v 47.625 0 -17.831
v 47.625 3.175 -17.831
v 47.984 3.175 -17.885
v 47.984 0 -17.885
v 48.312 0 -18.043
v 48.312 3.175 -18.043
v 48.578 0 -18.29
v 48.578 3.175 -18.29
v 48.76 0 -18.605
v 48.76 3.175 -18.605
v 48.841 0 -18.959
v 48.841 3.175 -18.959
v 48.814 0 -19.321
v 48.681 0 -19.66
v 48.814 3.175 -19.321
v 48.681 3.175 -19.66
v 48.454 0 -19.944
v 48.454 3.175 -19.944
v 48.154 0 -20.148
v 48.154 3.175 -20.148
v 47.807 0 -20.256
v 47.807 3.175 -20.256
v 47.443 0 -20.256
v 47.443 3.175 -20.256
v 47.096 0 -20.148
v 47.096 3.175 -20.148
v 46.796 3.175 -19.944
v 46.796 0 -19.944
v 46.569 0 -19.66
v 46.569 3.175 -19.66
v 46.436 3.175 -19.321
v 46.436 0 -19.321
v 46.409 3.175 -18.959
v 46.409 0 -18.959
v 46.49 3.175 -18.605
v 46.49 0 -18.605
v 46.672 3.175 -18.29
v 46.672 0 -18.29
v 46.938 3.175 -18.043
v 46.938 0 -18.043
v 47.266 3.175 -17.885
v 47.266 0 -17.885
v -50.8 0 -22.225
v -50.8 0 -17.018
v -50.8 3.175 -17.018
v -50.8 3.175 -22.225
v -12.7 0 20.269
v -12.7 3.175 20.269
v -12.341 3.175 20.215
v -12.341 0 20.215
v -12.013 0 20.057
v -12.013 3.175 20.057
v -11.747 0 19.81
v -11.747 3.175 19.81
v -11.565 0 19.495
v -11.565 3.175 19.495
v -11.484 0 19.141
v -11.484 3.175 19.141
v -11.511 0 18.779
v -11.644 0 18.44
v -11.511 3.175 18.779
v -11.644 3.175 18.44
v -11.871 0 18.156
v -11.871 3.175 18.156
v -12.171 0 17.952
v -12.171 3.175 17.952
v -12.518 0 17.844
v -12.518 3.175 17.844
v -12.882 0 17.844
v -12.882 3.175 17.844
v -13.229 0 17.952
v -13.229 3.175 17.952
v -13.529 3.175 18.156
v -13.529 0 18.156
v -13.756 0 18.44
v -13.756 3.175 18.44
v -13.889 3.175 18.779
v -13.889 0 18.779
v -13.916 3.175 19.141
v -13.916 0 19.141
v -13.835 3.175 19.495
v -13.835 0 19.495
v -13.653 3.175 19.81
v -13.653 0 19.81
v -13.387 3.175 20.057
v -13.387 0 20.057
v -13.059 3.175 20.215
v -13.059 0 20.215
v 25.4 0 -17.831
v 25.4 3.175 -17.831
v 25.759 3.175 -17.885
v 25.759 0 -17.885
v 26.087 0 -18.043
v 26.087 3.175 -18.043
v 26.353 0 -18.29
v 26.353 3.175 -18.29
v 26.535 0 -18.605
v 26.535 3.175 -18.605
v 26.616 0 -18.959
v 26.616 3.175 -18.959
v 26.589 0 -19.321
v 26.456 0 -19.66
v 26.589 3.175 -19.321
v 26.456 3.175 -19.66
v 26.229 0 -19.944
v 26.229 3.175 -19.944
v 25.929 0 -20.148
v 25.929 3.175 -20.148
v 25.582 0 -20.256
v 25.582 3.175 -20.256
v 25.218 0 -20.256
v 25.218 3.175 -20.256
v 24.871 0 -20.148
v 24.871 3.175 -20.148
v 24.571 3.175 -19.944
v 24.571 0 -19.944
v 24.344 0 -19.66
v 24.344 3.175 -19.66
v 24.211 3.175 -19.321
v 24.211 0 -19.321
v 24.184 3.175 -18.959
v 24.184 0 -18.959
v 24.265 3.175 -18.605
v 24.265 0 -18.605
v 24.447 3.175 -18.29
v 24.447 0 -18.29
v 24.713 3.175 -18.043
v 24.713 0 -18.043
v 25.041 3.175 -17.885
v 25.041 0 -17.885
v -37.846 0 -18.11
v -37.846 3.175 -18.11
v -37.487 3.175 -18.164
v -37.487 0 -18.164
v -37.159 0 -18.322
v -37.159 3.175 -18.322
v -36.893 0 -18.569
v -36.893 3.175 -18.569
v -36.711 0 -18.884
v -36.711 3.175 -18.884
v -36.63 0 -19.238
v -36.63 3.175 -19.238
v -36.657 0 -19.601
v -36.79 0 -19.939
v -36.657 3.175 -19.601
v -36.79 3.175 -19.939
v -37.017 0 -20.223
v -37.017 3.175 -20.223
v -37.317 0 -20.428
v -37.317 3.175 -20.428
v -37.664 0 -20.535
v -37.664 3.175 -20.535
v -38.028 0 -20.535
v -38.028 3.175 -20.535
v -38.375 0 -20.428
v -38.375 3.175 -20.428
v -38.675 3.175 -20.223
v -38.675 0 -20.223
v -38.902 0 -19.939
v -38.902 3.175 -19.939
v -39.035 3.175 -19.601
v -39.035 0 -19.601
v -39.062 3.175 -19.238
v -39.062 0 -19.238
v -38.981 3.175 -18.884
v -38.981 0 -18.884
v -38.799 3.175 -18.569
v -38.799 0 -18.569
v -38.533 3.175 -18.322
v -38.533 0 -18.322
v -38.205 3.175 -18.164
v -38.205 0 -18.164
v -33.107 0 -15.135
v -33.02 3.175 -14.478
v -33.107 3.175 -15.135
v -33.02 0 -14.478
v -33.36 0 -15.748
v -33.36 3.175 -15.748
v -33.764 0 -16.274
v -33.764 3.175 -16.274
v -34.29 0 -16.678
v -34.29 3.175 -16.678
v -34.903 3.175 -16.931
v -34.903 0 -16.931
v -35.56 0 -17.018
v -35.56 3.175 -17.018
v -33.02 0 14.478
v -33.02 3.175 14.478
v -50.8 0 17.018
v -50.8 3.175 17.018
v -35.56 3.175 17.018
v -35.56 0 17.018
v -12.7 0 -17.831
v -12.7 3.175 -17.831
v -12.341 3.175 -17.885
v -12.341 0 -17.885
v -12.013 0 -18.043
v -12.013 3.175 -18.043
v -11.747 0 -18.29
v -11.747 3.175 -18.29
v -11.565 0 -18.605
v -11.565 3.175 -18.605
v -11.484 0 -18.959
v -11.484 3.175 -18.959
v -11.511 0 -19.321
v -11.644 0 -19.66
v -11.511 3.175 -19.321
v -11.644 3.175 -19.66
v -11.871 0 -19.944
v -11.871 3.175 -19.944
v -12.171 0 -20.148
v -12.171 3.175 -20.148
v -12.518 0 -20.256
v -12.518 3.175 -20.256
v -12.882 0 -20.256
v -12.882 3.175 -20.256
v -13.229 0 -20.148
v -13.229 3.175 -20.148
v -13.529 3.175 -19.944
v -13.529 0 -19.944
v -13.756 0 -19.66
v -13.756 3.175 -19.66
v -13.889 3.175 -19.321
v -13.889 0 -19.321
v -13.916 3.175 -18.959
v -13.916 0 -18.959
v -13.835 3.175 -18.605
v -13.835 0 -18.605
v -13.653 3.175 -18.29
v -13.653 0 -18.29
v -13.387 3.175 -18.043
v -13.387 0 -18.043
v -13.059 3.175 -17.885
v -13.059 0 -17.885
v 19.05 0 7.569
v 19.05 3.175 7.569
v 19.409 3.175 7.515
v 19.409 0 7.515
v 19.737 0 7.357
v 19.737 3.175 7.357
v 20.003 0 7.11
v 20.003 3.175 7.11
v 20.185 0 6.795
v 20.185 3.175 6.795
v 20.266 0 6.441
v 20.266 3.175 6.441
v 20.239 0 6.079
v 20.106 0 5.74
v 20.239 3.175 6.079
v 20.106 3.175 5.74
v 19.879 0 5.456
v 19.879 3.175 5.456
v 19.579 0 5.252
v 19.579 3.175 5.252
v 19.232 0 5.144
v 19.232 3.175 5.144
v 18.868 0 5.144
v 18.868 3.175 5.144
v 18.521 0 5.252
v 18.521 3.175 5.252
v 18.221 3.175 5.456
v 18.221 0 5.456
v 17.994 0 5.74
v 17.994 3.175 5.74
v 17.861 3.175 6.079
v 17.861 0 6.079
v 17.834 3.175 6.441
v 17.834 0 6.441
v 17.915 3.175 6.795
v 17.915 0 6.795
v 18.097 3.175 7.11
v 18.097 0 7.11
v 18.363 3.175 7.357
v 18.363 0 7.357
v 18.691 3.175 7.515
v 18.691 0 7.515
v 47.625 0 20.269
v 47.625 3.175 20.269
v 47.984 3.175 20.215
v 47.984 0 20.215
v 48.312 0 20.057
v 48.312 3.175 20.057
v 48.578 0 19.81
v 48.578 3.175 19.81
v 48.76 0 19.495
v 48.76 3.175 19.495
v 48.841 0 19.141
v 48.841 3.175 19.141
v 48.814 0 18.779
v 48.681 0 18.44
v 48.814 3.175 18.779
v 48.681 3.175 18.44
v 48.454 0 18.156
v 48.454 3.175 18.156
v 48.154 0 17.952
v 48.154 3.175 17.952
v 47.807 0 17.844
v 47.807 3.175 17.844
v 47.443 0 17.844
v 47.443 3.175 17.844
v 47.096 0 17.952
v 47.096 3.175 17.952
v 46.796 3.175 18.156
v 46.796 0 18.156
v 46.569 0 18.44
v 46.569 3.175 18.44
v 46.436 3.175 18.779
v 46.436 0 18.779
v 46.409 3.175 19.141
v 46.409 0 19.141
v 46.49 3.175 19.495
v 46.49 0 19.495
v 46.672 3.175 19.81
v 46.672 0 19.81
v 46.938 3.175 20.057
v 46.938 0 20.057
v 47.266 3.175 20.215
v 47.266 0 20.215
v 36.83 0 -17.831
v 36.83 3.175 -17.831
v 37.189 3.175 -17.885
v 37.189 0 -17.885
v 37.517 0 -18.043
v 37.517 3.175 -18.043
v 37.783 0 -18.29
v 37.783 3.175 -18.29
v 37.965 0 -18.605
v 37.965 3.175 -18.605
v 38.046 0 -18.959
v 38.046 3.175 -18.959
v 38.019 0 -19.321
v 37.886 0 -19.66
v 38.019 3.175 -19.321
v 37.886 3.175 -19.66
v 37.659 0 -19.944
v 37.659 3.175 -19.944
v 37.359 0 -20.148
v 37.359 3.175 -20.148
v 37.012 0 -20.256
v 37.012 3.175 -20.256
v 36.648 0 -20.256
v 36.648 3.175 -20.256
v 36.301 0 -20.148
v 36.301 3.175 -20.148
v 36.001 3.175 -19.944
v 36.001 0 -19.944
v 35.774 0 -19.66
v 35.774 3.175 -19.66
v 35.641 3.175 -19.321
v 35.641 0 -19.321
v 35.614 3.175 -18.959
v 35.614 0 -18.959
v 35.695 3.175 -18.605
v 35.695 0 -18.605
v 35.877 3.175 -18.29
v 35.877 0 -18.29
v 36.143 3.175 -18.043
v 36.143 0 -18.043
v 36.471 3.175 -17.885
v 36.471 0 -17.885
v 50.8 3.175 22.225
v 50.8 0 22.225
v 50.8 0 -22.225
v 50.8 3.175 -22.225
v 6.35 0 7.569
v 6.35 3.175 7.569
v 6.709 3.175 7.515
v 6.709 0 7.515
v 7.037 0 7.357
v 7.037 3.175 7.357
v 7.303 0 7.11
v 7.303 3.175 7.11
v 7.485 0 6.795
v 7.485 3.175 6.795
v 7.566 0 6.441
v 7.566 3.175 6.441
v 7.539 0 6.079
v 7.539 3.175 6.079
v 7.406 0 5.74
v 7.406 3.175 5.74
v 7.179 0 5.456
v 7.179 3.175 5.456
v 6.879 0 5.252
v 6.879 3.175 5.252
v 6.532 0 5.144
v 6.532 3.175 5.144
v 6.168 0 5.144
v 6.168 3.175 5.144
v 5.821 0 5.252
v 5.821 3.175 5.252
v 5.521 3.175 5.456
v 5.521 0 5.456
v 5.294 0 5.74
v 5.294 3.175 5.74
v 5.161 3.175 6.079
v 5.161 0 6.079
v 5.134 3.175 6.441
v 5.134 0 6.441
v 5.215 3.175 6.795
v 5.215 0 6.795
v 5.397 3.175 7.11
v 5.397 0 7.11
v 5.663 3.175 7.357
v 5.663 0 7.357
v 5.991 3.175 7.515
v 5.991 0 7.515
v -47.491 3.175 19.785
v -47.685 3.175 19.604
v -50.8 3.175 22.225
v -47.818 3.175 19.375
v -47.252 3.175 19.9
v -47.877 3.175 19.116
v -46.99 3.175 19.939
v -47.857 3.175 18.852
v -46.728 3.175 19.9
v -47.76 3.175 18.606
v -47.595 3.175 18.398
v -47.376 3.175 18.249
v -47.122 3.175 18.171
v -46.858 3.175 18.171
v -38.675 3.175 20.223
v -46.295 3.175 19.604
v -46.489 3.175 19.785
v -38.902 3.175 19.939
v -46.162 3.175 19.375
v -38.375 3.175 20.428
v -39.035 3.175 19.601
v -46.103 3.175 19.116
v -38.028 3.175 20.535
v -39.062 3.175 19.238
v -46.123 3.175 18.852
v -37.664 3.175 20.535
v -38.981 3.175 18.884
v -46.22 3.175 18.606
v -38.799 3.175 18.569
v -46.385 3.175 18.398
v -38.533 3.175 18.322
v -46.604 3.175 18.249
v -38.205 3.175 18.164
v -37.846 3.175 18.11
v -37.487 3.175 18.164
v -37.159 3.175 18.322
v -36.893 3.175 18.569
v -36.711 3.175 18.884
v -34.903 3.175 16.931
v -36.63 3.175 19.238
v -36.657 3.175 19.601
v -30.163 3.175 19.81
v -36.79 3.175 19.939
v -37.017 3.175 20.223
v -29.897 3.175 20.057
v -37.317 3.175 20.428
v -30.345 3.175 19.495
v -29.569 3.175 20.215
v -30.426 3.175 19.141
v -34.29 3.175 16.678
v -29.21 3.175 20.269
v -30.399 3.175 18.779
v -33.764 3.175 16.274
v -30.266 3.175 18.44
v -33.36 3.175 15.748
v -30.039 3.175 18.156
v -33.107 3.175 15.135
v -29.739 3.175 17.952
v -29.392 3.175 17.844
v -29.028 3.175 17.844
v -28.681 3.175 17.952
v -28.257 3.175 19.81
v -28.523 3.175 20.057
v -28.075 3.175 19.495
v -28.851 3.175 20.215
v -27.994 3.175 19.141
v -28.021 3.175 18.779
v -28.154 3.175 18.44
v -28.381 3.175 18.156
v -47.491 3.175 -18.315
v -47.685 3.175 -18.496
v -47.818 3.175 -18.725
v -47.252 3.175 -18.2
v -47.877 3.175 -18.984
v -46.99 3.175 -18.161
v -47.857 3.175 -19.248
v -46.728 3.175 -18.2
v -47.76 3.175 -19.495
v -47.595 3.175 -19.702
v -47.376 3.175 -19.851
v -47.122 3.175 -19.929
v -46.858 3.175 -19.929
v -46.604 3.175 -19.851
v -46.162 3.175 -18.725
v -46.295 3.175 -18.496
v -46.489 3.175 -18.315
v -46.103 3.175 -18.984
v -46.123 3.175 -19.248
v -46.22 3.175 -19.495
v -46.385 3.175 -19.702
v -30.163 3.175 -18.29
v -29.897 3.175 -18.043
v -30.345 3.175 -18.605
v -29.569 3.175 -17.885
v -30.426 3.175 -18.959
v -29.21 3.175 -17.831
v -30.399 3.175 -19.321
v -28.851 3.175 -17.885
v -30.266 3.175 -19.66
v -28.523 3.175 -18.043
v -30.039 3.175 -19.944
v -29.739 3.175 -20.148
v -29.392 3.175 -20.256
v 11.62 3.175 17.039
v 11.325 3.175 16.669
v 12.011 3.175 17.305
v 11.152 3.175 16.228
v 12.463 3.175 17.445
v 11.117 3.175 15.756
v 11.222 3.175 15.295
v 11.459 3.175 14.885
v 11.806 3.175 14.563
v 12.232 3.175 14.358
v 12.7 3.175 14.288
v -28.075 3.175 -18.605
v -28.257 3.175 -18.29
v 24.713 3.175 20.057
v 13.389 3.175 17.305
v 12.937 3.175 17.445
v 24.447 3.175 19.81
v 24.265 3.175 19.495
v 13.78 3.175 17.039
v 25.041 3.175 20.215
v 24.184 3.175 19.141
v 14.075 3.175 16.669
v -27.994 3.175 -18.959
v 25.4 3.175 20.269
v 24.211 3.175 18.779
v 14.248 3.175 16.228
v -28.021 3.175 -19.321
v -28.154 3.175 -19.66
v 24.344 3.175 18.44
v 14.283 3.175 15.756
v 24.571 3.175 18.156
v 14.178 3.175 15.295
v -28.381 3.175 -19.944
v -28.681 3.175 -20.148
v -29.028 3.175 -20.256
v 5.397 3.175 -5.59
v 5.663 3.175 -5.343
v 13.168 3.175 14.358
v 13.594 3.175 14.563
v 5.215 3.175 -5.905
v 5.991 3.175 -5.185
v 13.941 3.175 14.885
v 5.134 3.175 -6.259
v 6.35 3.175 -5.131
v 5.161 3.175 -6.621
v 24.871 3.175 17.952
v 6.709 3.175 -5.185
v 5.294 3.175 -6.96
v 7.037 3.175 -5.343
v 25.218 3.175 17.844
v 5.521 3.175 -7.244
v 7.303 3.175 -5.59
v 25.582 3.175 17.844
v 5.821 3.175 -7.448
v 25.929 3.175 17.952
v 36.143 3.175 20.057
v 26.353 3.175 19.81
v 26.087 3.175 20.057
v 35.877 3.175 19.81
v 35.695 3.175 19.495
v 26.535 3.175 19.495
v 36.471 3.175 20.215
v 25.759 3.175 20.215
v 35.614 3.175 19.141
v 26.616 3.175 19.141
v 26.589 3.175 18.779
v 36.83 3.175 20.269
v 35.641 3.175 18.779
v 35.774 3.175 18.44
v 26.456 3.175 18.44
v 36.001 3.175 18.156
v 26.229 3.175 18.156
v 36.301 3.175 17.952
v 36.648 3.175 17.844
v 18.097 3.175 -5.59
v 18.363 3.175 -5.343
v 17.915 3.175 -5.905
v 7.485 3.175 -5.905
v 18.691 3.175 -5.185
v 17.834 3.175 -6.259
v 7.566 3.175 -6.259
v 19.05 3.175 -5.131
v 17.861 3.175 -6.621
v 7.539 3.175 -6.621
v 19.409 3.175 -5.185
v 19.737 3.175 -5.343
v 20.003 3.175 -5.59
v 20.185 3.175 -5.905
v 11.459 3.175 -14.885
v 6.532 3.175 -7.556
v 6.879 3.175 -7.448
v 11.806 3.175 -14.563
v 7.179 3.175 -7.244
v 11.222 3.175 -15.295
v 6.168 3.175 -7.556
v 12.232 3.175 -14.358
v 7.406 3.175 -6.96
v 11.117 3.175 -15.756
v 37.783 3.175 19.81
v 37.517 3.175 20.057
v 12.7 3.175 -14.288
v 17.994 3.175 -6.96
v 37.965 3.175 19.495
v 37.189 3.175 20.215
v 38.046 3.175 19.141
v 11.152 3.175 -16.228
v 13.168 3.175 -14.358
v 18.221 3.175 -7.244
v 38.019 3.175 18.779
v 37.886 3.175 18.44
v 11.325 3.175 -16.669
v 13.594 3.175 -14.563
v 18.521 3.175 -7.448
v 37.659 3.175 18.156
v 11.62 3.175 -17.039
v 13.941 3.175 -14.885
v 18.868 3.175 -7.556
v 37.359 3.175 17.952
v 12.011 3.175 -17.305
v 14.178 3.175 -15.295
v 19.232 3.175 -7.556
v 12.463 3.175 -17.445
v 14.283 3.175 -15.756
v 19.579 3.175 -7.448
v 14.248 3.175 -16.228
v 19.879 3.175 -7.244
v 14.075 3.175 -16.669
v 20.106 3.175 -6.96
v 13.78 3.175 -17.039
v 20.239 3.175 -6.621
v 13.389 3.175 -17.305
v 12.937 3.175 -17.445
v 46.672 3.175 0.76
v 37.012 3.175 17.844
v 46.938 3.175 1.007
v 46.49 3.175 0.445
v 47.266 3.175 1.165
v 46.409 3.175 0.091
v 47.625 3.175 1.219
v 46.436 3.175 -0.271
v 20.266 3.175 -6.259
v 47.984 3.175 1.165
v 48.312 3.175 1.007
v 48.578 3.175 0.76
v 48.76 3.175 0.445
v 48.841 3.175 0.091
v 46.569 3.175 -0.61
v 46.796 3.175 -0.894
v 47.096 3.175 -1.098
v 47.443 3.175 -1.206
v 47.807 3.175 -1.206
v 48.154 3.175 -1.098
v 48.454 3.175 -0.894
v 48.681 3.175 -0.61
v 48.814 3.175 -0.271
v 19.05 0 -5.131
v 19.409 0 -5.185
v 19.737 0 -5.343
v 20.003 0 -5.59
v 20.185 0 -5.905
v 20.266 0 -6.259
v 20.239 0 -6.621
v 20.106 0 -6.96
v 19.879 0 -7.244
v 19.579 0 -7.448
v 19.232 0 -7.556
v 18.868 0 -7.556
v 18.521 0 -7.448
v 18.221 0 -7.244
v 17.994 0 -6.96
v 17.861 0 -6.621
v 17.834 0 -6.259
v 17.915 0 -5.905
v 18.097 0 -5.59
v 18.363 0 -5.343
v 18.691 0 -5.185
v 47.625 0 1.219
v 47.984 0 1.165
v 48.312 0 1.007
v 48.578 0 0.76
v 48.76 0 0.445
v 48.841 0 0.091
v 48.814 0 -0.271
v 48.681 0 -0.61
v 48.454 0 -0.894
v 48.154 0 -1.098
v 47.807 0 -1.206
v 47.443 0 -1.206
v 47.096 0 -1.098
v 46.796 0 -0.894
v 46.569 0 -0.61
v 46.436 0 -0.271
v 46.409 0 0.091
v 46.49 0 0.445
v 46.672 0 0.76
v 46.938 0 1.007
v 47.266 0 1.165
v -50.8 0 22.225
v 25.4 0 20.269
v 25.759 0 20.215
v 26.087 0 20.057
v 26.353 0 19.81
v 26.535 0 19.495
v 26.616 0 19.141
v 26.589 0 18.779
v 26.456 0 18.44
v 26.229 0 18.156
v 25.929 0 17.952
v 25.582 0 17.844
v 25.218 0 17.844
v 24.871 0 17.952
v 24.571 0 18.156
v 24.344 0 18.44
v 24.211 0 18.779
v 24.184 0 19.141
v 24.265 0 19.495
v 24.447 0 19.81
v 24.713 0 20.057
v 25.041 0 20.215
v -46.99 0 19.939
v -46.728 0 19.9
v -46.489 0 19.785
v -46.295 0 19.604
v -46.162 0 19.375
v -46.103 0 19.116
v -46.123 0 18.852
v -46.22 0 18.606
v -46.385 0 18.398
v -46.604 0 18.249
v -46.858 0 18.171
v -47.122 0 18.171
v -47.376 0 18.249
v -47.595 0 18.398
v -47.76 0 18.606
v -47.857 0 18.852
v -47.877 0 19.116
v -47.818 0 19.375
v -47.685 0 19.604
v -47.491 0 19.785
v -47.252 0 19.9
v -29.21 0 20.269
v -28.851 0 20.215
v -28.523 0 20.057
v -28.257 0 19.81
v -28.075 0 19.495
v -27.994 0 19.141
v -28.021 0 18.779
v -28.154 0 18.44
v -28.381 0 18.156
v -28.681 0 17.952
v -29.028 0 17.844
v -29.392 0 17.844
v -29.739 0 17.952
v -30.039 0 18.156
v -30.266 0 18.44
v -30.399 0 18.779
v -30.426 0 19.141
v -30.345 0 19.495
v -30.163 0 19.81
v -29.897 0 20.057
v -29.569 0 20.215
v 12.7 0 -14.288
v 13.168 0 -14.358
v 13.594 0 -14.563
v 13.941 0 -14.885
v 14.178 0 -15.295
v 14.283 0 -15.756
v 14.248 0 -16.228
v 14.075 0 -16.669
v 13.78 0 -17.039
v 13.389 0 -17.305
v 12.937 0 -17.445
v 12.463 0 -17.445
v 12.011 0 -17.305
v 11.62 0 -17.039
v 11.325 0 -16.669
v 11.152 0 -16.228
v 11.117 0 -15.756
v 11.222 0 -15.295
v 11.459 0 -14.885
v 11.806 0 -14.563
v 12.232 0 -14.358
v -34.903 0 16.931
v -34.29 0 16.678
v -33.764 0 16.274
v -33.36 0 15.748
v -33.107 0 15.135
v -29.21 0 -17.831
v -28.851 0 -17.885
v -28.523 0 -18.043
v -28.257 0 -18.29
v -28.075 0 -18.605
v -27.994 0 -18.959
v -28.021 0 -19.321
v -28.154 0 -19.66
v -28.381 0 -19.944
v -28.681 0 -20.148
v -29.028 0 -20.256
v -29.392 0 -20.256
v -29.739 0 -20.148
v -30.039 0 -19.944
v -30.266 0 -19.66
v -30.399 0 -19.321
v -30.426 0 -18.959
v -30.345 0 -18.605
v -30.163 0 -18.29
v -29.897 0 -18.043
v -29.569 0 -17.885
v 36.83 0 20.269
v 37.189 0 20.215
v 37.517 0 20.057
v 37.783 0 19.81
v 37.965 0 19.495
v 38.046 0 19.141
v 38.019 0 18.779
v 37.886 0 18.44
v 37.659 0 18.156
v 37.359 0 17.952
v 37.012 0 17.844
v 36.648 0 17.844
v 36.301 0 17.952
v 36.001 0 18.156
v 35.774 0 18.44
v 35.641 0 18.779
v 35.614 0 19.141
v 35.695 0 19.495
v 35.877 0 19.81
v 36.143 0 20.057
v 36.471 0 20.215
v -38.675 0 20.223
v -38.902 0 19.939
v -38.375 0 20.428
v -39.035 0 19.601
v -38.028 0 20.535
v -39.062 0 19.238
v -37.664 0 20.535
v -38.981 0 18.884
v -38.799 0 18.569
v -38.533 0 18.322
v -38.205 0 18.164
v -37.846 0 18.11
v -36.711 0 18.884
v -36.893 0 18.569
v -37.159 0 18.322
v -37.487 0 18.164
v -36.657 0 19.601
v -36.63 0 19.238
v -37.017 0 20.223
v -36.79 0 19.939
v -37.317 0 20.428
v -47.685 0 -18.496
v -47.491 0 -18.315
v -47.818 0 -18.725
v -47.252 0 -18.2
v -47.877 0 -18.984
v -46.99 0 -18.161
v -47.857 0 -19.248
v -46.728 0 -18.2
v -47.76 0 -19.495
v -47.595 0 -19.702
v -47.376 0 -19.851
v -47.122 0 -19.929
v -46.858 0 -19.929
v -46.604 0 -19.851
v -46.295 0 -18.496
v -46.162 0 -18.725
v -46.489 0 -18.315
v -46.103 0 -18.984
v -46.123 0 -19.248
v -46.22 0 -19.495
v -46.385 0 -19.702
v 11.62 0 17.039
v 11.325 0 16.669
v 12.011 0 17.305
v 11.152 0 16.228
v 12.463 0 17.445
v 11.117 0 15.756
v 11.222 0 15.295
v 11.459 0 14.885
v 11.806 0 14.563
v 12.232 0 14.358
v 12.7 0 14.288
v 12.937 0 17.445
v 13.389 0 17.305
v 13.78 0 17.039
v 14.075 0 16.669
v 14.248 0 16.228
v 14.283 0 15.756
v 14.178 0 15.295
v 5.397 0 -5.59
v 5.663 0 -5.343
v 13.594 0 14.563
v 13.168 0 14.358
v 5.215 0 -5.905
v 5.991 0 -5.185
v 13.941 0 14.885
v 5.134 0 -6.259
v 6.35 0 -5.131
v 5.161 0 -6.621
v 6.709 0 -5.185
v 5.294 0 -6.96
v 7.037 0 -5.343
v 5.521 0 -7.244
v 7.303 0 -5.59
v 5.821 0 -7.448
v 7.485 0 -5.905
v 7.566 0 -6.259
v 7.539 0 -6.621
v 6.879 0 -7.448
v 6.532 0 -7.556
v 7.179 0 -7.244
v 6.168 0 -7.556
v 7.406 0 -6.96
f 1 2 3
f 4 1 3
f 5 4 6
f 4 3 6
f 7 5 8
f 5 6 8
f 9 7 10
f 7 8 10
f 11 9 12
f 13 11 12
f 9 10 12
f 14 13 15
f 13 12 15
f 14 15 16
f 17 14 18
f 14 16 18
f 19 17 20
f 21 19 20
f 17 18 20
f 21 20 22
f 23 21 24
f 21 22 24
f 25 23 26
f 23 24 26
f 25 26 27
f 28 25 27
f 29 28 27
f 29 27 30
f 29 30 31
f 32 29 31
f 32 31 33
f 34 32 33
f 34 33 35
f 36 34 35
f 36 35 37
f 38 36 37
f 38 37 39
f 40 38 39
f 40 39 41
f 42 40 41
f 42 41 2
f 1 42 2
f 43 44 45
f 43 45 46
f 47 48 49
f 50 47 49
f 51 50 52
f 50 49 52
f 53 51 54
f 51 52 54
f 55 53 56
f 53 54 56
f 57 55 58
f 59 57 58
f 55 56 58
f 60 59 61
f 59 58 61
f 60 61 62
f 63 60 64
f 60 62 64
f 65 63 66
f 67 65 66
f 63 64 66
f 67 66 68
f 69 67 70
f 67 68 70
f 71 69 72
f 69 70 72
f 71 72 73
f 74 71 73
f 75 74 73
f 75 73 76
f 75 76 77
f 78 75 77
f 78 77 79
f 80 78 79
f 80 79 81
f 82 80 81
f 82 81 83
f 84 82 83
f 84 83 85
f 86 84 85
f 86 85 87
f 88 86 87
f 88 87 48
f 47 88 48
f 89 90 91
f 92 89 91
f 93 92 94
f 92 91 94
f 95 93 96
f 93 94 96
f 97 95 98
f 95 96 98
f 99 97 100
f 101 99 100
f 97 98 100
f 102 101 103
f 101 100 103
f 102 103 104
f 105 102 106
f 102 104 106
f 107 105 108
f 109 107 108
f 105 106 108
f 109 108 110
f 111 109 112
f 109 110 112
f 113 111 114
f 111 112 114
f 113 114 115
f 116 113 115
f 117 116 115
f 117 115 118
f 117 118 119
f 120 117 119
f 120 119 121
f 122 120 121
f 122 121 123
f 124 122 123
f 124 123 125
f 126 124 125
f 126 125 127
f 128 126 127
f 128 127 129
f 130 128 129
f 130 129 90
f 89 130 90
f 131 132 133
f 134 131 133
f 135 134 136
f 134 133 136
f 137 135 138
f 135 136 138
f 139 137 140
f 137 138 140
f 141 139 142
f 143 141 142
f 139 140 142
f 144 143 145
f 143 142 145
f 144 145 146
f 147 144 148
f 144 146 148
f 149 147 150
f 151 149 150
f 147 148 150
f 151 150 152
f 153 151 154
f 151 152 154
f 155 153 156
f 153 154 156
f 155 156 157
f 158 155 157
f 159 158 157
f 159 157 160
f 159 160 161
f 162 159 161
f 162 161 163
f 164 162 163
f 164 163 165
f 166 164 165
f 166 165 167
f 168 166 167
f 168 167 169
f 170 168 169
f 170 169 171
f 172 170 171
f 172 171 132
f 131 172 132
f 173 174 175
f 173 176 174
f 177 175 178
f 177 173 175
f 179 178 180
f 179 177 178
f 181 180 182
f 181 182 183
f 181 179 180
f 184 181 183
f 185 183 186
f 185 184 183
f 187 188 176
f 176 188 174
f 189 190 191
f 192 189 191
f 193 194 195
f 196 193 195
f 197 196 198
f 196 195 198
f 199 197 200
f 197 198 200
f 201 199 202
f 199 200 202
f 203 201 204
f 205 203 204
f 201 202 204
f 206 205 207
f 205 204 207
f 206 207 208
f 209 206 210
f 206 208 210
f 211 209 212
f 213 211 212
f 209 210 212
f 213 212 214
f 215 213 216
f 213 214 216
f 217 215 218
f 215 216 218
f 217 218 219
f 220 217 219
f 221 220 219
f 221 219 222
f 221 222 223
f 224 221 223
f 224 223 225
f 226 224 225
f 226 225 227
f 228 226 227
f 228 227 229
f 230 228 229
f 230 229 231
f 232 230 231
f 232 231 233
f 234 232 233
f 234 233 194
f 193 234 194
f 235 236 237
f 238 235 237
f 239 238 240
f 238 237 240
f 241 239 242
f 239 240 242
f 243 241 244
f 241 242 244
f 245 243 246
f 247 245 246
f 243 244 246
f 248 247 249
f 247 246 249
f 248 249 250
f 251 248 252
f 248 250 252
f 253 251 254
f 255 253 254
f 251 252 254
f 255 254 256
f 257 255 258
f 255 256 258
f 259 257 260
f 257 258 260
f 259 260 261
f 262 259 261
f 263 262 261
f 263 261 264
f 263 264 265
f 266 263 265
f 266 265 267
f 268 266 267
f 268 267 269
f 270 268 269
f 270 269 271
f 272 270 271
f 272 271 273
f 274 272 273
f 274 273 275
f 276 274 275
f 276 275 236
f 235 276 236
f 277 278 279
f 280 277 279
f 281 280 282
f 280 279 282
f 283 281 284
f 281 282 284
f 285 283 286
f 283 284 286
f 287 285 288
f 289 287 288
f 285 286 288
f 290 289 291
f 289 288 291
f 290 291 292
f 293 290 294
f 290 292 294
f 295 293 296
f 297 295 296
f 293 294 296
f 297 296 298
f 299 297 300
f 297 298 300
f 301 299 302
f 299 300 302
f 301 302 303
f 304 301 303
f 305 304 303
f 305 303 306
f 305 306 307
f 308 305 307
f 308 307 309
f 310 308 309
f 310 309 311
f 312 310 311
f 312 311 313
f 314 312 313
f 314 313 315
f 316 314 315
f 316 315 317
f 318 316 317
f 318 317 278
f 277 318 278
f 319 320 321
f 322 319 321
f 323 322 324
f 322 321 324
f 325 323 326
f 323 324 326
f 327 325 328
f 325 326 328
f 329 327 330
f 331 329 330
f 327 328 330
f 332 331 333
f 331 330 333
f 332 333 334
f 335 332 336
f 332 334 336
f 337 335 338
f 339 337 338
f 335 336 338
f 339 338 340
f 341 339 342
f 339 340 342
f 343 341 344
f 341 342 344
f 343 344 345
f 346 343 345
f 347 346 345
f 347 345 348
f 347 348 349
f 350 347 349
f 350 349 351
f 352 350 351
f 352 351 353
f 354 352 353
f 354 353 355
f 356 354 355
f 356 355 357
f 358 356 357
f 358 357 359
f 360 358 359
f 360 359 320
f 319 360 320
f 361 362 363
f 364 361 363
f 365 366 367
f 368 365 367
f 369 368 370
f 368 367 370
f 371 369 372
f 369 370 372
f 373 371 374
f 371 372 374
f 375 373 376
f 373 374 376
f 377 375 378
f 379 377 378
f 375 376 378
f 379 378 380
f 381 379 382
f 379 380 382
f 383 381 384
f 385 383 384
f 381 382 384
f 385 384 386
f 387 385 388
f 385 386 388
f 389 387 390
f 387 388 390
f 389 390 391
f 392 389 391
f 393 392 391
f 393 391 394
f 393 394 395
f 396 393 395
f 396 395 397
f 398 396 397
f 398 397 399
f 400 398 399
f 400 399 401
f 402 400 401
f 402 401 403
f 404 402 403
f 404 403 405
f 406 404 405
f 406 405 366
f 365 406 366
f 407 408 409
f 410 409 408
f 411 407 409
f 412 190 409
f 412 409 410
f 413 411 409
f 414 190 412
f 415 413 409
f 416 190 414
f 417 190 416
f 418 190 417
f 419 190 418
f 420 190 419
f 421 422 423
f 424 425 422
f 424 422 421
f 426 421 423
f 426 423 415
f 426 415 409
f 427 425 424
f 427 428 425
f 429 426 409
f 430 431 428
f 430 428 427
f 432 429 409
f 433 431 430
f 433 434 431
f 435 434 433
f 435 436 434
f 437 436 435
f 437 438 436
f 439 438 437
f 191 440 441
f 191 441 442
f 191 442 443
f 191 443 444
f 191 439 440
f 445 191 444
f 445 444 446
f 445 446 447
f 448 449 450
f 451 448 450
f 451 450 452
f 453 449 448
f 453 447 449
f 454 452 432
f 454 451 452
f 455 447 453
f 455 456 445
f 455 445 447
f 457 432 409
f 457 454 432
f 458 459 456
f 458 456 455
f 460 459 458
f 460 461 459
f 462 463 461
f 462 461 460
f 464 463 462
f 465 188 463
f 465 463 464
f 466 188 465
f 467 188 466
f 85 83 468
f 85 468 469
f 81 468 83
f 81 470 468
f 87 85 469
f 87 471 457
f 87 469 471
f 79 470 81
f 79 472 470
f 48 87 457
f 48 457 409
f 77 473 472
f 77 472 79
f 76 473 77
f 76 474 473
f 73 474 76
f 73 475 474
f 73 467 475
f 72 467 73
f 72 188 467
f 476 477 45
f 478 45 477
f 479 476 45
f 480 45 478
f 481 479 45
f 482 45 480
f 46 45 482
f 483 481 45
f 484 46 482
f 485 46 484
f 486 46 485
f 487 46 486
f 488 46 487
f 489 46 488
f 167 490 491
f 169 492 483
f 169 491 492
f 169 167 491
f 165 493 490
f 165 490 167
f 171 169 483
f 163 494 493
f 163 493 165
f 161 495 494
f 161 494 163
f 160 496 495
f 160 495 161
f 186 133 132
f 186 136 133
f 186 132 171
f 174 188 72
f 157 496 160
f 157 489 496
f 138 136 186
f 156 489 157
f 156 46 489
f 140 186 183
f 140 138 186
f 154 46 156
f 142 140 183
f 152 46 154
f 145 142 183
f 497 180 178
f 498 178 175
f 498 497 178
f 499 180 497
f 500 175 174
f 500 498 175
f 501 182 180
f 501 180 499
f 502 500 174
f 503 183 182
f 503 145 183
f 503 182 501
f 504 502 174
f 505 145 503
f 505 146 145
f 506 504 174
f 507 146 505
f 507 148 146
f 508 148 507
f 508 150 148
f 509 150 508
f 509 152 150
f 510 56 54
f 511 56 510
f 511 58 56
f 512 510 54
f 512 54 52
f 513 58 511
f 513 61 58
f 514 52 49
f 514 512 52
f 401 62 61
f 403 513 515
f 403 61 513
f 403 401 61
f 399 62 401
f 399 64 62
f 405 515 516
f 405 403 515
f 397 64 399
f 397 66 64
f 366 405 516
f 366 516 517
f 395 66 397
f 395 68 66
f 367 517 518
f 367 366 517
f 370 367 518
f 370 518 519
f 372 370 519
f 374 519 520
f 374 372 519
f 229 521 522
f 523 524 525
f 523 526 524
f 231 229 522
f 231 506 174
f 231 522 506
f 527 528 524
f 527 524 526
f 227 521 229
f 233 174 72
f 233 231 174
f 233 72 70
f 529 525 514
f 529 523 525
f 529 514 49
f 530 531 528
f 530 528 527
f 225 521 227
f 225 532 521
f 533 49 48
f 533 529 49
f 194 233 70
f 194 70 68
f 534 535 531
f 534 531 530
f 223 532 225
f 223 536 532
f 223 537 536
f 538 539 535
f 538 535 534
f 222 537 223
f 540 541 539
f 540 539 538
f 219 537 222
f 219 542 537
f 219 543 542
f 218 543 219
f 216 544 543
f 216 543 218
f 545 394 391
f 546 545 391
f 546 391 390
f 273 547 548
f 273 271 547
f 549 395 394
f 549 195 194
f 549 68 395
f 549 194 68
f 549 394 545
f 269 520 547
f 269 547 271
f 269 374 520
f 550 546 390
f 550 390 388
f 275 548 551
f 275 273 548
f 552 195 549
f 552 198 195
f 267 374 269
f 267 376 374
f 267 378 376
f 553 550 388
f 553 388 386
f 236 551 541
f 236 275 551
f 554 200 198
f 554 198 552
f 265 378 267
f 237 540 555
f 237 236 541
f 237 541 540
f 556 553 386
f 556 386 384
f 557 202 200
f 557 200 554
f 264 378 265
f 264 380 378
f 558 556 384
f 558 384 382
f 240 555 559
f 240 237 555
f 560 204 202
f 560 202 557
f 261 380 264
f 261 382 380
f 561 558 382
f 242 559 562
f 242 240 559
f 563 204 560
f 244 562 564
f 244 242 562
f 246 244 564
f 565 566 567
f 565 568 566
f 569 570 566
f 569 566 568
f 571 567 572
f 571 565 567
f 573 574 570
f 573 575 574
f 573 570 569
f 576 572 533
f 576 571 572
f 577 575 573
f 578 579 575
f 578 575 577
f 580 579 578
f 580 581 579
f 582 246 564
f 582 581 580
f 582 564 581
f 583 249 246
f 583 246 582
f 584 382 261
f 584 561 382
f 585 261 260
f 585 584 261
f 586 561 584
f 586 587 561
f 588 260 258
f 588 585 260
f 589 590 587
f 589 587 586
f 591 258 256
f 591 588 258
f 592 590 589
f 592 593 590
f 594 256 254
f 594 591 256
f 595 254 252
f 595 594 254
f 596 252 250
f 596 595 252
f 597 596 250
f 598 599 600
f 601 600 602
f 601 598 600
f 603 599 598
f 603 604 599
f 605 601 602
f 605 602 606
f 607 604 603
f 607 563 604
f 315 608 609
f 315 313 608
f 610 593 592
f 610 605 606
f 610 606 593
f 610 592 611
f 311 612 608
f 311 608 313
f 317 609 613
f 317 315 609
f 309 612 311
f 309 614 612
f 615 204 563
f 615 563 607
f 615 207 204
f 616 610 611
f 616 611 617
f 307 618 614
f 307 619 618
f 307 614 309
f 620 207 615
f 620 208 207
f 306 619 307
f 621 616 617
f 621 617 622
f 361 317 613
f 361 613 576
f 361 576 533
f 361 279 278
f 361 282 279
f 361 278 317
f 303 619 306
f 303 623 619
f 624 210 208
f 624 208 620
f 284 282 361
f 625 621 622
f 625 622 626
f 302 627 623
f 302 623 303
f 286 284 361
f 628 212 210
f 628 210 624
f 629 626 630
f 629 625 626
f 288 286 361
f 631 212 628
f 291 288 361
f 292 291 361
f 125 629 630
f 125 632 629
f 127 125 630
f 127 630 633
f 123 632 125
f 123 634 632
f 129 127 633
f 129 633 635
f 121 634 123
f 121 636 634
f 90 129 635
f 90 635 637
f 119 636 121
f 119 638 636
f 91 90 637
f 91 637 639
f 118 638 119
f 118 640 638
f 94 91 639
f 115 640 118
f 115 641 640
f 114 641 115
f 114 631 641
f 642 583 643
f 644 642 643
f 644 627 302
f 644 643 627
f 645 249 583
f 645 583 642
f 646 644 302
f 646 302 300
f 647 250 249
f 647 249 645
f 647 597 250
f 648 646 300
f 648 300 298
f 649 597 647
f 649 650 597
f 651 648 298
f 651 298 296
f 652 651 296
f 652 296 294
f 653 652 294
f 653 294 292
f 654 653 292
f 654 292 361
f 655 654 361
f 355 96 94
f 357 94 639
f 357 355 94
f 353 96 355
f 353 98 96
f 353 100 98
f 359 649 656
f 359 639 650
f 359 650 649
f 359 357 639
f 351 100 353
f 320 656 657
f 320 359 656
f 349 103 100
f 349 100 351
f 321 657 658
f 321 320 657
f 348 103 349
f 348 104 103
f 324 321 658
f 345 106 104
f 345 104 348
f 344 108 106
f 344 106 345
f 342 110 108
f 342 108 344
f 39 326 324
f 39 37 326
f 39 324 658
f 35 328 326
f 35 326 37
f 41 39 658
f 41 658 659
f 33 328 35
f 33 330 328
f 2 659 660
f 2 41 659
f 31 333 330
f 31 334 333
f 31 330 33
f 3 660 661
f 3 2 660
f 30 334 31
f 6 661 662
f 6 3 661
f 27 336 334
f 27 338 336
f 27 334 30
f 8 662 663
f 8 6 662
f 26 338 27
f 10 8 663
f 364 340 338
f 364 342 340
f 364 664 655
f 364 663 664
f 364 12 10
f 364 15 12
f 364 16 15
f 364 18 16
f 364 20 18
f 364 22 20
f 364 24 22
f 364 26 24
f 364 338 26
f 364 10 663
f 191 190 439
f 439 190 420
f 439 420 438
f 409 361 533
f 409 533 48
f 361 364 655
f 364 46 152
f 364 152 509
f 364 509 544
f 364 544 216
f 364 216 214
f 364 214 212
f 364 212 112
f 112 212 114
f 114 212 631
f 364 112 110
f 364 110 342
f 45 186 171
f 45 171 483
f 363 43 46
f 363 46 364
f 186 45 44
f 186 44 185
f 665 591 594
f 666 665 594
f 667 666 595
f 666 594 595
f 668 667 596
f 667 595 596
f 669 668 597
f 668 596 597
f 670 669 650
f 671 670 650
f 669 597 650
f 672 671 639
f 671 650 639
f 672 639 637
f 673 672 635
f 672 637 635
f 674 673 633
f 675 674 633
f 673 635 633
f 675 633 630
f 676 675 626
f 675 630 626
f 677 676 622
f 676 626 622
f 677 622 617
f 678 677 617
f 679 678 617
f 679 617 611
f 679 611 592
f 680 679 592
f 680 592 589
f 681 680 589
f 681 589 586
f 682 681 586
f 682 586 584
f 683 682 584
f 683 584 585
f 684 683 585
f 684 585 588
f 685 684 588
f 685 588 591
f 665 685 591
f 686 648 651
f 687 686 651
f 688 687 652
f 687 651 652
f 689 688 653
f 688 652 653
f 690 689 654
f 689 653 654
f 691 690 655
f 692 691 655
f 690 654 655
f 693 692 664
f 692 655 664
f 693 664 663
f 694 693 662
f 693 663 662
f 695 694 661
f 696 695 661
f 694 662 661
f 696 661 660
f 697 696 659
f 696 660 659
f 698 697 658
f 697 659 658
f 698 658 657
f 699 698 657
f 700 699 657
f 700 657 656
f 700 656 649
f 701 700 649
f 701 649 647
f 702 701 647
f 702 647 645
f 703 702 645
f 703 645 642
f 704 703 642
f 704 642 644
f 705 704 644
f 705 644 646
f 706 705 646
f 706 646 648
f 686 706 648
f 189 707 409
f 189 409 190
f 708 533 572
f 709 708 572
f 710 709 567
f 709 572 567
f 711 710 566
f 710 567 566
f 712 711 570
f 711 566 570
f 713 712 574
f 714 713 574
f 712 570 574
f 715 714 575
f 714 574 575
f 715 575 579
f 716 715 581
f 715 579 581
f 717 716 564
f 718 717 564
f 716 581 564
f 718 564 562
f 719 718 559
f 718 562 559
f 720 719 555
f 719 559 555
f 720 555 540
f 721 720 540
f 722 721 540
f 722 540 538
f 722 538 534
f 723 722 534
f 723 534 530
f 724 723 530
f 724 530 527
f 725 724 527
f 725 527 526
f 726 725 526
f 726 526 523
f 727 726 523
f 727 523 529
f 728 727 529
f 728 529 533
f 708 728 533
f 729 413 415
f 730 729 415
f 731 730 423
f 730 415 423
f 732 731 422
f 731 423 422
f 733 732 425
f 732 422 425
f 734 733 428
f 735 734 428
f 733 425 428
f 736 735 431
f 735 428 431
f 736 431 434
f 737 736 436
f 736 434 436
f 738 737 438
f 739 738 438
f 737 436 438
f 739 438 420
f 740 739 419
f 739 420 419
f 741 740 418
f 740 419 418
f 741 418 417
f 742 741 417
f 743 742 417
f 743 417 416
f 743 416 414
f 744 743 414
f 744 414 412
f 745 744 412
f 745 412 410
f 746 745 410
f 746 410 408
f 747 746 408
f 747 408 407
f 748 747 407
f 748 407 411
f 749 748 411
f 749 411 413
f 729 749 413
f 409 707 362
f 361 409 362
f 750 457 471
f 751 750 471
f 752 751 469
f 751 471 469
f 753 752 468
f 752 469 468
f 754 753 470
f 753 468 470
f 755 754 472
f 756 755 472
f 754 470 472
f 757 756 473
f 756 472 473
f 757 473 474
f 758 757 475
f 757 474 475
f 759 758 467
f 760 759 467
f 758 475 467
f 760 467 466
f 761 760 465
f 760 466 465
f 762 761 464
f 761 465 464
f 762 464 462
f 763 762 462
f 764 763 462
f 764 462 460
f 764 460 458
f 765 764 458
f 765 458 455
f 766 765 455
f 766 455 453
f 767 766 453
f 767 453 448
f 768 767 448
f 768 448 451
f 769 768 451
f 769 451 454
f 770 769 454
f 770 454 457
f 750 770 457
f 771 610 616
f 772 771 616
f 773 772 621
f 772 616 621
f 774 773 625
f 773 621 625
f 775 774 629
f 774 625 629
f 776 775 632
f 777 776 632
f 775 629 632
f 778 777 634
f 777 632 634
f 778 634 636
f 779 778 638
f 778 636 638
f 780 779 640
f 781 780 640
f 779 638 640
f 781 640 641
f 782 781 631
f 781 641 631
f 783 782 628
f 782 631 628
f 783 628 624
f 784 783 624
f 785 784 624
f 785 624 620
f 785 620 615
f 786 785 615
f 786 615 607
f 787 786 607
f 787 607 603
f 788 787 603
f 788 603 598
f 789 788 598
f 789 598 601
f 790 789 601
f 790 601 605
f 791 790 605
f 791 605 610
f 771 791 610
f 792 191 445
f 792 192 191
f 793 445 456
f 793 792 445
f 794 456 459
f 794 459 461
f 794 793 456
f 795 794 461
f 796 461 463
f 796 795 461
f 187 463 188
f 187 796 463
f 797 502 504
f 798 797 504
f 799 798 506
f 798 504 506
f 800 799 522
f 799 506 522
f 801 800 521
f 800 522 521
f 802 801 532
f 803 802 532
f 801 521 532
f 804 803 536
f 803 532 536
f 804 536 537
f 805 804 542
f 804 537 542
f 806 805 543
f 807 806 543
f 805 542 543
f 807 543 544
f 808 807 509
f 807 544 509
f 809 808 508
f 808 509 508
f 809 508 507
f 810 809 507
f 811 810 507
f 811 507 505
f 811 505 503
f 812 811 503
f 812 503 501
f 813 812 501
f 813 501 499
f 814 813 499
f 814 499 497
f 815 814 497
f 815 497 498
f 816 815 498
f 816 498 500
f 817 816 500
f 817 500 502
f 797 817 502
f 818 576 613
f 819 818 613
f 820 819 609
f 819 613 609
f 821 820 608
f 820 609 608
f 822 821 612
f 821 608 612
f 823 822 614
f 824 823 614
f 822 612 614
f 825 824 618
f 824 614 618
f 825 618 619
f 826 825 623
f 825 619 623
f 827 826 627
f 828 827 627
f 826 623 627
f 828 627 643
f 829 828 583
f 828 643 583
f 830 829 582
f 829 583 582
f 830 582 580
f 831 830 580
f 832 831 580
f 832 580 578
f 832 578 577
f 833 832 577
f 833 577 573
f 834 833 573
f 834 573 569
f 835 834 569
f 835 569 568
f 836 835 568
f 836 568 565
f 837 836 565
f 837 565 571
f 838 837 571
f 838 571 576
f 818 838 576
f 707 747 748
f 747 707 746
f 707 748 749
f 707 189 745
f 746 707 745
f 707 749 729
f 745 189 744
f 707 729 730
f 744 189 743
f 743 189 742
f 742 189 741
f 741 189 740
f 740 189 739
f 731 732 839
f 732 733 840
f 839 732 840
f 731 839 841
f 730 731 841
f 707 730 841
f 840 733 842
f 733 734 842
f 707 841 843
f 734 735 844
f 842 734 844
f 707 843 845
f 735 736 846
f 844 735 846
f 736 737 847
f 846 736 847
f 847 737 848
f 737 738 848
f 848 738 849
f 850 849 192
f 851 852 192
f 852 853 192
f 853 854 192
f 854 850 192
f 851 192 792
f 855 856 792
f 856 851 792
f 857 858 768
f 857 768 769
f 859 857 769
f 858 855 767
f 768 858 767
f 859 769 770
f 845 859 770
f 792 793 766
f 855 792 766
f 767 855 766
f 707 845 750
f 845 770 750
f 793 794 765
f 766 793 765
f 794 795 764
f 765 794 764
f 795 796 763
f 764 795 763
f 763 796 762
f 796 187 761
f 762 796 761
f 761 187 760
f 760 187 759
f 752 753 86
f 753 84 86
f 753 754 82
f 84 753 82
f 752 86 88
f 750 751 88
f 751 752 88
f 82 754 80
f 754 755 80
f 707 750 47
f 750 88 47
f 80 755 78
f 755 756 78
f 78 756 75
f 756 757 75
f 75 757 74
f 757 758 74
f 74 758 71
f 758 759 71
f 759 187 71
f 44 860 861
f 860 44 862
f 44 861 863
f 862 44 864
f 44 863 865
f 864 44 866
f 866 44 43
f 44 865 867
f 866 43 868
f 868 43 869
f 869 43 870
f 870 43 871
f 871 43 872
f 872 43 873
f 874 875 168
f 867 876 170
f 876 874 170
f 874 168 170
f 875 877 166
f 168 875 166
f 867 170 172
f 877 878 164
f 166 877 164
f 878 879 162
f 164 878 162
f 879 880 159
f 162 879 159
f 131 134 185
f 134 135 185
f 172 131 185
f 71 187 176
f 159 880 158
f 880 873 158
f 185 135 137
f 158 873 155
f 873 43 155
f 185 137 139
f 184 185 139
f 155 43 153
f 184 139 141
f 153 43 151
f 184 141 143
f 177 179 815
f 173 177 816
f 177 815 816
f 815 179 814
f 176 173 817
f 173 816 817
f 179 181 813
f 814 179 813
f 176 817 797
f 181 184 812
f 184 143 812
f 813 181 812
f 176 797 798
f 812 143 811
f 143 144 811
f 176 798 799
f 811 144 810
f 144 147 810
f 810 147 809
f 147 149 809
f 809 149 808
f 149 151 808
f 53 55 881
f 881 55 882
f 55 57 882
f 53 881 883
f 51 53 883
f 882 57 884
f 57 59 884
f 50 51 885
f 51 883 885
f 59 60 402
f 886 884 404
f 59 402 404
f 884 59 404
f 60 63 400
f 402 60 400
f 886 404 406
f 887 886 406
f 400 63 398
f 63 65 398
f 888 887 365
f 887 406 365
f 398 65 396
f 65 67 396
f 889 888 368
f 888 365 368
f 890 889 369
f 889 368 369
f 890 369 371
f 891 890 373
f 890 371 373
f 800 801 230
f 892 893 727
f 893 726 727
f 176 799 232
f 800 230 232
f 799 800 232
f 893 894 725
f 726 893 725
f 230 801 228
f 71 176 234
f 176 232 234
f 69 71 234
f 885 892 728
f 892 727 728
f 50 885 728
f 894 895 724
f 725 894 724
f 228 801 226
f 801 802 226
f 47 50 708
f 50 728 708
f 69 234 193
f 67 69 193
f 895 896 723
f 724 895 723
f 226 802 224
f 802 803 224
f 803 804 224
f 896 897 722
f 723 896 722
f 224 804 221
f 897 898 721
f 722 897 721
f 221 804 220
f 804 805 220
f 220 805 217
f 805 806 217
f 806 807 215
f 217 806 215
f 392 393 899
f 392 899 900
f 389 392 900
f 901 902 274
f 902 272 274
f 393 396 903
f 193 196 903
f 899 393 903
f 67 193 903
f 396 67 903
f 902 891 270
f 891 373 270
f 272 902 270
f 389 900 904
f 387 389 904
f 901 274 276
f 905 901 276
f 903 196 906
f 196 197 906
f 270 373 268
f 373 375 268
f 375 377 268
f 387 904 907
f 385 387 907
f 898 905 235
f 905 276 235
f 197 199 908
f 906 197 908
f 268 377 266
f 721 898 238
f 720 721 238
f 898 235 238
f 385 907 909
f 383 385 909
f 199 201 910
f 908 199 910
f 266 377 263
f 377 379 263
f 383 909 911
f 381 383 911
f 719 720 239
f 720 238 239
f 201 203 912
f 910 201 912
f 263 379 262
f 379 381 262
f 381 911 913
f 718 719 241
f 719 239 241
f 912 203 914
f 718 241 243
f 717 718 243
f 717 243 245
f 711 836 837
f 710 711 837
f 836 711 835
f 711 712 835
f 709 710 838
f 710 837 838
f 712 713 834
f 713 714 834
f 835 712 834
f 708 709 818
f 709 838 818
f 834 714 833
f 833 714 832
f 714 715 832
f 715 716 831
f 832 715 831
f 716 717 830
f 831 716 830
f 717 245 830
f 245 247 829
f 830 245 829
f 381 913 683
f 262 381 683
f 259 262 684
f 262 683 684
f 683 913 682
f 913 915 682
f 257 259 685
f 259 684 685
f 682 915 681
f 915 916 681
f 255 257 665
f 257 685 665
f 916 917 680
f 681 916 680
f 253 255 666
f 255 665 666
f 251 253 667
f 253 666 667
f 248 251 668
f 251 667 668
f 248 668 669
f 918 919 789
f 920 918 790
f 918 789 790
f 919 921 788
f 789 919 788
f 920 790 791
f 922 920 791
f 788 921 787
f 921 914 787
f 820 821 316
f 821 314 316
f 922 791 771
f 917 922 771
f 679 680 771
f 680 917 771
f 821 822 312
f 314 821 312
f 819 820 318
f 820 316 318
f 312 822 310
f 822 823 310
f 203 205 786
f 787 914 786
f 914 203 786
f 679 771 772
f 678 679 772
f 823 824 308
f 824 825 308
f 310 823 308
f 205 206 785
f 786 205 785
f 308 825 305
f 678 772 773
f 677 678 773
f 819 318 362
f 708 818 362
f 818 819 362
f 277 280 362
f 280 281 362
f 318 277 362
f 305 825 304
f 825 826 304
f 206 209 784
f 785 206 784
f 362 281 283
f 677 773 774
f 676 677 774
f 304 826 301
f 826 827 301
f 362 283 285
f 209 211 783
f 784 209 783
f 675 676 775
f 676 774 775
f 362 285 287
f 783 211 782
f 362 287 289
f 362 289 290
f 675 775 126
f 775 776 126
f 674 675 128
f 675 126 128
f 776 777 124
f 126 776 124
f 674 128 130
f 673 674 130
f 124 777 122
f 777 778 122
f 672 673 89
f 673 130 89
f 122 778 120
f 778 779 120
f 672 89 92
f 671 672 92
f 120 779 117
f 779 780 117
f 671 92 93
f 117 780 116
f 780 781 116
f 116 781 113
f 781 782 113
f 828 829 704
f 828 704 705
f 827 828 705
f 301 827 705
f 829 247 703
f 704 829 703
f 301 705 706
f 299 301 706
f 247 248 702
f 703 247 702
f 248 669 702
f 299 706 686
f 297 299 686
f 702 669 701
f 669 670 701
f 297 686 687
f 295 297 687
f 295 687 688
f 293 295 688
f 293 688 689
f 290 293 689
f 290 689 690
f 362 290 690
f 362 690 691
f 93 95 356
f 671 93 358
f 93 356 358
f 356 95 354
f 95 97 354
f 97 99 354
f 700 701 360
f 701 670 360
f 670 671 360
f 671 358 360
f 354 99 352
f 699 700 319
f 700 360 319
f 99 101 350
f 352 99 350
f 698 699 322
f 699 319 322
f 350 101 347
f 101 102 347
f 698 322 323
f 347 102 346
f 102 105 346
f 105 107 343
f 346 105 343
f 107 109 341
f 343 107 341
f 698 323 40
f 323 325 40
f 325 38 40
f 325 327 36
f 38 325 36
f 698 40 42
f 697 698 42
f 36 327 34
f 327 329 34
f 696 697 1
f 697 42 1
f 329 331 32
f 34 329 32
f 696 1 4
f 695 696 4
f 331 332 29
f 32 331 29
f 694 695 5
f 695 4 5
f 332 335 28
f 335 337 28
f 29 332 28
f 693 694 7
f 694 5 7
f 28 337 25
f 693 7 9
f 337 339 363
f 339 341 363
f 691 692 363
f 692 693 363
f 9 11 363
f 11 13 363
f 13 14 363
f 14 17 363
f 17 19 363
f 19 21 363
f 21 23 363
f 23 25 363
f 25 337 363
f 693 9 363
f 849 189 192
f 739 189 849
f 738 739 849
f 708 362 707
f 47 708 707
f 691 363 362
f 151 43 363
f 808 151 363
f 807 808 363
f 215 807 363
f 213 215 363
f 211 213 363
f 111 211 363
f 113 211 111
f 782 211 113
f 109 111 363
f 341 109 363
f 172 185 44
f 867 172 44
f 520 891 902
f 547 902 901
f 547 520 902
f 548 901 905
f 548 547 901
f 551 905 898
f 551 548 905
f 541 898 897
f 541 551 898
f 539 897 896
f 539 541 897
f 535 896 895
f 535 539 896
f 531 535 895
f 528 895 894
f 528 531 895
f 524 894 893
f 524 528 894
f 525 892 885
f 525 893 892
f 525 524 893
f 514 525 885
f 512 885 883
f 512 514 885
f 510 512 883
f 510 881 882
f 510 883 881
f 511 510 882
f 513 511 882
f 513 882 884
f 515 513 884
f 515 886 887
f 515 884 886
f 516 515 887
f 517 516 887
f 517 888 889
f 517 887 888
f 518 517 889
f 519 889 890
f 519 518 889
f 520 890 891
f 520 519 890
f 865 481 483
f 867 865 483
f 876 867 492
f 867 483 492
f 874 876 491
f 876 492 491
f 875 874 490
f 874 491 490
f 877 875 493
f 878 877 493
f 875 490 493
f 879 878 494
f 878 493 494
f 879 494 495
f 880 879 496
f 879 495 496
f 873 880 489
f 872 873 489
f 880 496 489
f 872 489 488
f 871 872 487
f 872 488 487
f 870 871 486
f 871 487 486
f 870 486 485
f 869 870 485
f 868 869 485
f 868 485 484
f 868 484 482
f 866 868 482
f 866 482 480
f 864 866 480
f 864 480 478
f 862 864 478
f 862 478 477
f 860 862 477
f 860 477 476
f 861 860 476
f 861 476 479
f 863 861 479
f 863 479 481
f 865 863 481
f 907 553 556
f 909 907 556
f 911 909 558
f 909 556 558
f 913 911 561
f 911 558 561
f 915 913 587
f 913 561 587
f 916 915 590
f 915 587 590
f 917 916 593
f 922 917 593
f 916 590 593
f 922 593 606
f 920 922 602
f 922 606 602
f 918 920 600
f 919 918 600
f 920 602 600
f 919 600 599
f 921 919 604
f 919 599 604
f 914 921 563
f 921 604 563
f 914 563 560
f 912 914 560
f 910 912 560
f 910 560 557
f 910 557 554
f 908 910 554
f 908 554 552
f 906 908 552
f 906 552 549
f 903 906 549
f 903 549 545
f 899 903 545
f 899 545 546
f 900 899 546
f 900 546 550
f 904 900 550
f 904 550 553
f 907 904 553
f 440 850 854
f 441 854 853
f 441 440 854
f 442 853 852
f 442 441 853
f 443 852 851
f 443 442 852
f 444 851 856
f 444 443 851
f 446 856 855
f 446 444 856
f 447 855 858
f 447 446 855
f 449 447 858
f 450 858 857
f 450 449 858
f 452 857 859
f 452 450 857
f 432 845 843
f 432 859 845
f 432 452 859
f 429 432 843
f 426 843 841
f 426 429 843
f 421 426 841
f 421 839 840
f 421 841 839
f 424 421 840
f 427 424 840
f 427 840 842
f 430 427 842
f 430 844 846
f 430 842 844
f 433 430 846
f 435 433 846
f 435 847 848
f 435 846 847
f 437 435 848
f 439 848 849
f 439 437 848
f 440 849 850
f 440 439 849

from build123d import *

# Parameters (mm, degrees)
SKETCH1_W           = 101.6
SKETCH1_H           = 44.45
BOSS_EXTRUDE1_DEPTH = 3.175
SKETCH2_R           = 0.889
SKETCH2_R_2         = 1.2192
CUT_EXTRUDE1_DEPTH  = 56.539816798
SKETCH3_R           = 1.2192
SKETCH3_R_2         = 1.5875
CUT_EXTRUDE2_DEPTH  = 56.539816798
SKETCH4_W           = 17.78
SKETCH4_H           = 34.036
CUT_EXTRUDE3_DEPTH  = 56.539816798
FILLET2_R           = 2.54


with BuildPart() as part:
    # Sketch1 → Boss-Extrude1 (new body)
    with BuildSketch(Plane(origin=(0, 0, 0), x_dir=(1, 0, 0), z_dir=(0, 1, 0))):
        Rectangle(SKETCH1_W, SKETCH1_H)
    extrude(amount=BOSS_EXTRUDE1_DEPTH)

    # Sketch2 → Cut-Extrude1 (cut, through all)
    with BuildSketch(Plane(origin=(0, 3.175, 0), x_dir=(1, 0, 0), z_dir=(0, 1, 0))):
        with Locations(Location((-46.99, 19.05, 0), (0, 0, 270))):
            Circle(SKETCH2_R)
        with Locations(Location((-29.21, 19.05, 0), (0, 0, 270))):
            Circle(SKETCH2_R_2)
        with Locations(Location((-12.7, 19.05, 0), (0, 0, 270))):
            Circle(SKETCH2_R_2)
        with Locations(Location((25.4, 19.05, 0), (0, 0, 270))):
            Circle(SKETCH2_R_2)
        with Locations(Location((36.83, 19.05, 0), (0, 0, 270))):
            Circle(SKETCH2_R_2)
        with Locations(Location((47.625, 19.05, 0), (0, 0, 270))):
            Circle(SKETCH2_R_2)
        with Locations(Location((47.625, 0, 0), (0, 0, 270))):
            Circle(SKETCH2_R_2)
        with Locations(Location((47.625, -19.05, 0), (0, 0, 270))):
            Circle(SKETCH2_R_2)
        with Locations(Location((36.83, -19.05, 0), (0, 0, 270))):
            Circle(SKETCH2_R_2)
        with Locations(Location((25.4, -19.05, 0), (0, 0, 270))):
            Circle(SKETCH2_R_2)
        with Locations(Location((-12.7, -19.05, 0), (0, 0, 270))):
            Circle(SKETCH2_R_2)
        with Locations(Location((-29.21, -19.05, 0), (0, 0, 270))):
            Circle(SKETCH2_R_2)
        with Locations(Location((-46.99, -19.05, 0), (0, 0, 270))):
            Circle(SKETCH2_R)
        with Locations(Location((19.05, -6.35, 0), (0, 0, 270))):
            Circle(SKETCH2_R_2)
        with Locations(Location((19.05, 6.35, 0), (0, 0, 270))):
            Circle(SKETCH2_R_2)
        with Locations(Location((6.35, 6.35, 0), (0, 0, 270))):
            Circle(SKETCH2_R_2)
        with Locations(Location((6.35, -6.35, 0), (0, 0, 270))):
            Circle(SKETCH2_R_2)
    extrude(amount=-CUT_EXTRUDE1_DEPTH, mode=Mode.SUBTRACT)

    # Sketch3 → Cut-Extrude2 (cut, through all)
    with BuildSketch(Plane(origin=(0, 3.175, 0), x_dir=(1, 0, 0), z_dir=(0, 1, 0))):
        with Locations(Location((-37.846, 19.3294, 0), (0, 0, 270))):
            Circle(SKETCH3_R)
        with Locations(Location((12.7, 15.875, 0), (0, 0, 270))):
            Circle(SKETCH3_R_2)
    cut_extrude2 = extrude(amount=-CUT_EXTRUDE2_DEPTH, mode=Mode.SUBTRACT)

    # Mirror1: Cut-Extrude2 across plane
    add(cut_extrude2.mirror(Plane.XY), mode=Mode.SUBTRACT)

    # Sketch4 → Cut-Extrude3 (cut, through all)
    with BuildSketch(Plane(origin=(0, 3.175, 0), x_dir=(1, 0, 0), z_dir=(0, 1, 0))):
        with Locations((-41.91, 0)):
            Rectangle(SKETCH4_W, SKETCH4_H)
    extrude(amount=-CUT_EXTRUDE3_DEPTH, mode=Mode.SUBTRACT)

    # Fillet2
    fillet2_edges = [part.edges().sort_by_distance(p)[0] for p in [
        (-33.02, 1.5875, -17.018),
        (-33.02, 1.5875, 17.018),
    ]]
    fillet(fillet2_edges, radius=FILLET2_R)


solid = part.part
